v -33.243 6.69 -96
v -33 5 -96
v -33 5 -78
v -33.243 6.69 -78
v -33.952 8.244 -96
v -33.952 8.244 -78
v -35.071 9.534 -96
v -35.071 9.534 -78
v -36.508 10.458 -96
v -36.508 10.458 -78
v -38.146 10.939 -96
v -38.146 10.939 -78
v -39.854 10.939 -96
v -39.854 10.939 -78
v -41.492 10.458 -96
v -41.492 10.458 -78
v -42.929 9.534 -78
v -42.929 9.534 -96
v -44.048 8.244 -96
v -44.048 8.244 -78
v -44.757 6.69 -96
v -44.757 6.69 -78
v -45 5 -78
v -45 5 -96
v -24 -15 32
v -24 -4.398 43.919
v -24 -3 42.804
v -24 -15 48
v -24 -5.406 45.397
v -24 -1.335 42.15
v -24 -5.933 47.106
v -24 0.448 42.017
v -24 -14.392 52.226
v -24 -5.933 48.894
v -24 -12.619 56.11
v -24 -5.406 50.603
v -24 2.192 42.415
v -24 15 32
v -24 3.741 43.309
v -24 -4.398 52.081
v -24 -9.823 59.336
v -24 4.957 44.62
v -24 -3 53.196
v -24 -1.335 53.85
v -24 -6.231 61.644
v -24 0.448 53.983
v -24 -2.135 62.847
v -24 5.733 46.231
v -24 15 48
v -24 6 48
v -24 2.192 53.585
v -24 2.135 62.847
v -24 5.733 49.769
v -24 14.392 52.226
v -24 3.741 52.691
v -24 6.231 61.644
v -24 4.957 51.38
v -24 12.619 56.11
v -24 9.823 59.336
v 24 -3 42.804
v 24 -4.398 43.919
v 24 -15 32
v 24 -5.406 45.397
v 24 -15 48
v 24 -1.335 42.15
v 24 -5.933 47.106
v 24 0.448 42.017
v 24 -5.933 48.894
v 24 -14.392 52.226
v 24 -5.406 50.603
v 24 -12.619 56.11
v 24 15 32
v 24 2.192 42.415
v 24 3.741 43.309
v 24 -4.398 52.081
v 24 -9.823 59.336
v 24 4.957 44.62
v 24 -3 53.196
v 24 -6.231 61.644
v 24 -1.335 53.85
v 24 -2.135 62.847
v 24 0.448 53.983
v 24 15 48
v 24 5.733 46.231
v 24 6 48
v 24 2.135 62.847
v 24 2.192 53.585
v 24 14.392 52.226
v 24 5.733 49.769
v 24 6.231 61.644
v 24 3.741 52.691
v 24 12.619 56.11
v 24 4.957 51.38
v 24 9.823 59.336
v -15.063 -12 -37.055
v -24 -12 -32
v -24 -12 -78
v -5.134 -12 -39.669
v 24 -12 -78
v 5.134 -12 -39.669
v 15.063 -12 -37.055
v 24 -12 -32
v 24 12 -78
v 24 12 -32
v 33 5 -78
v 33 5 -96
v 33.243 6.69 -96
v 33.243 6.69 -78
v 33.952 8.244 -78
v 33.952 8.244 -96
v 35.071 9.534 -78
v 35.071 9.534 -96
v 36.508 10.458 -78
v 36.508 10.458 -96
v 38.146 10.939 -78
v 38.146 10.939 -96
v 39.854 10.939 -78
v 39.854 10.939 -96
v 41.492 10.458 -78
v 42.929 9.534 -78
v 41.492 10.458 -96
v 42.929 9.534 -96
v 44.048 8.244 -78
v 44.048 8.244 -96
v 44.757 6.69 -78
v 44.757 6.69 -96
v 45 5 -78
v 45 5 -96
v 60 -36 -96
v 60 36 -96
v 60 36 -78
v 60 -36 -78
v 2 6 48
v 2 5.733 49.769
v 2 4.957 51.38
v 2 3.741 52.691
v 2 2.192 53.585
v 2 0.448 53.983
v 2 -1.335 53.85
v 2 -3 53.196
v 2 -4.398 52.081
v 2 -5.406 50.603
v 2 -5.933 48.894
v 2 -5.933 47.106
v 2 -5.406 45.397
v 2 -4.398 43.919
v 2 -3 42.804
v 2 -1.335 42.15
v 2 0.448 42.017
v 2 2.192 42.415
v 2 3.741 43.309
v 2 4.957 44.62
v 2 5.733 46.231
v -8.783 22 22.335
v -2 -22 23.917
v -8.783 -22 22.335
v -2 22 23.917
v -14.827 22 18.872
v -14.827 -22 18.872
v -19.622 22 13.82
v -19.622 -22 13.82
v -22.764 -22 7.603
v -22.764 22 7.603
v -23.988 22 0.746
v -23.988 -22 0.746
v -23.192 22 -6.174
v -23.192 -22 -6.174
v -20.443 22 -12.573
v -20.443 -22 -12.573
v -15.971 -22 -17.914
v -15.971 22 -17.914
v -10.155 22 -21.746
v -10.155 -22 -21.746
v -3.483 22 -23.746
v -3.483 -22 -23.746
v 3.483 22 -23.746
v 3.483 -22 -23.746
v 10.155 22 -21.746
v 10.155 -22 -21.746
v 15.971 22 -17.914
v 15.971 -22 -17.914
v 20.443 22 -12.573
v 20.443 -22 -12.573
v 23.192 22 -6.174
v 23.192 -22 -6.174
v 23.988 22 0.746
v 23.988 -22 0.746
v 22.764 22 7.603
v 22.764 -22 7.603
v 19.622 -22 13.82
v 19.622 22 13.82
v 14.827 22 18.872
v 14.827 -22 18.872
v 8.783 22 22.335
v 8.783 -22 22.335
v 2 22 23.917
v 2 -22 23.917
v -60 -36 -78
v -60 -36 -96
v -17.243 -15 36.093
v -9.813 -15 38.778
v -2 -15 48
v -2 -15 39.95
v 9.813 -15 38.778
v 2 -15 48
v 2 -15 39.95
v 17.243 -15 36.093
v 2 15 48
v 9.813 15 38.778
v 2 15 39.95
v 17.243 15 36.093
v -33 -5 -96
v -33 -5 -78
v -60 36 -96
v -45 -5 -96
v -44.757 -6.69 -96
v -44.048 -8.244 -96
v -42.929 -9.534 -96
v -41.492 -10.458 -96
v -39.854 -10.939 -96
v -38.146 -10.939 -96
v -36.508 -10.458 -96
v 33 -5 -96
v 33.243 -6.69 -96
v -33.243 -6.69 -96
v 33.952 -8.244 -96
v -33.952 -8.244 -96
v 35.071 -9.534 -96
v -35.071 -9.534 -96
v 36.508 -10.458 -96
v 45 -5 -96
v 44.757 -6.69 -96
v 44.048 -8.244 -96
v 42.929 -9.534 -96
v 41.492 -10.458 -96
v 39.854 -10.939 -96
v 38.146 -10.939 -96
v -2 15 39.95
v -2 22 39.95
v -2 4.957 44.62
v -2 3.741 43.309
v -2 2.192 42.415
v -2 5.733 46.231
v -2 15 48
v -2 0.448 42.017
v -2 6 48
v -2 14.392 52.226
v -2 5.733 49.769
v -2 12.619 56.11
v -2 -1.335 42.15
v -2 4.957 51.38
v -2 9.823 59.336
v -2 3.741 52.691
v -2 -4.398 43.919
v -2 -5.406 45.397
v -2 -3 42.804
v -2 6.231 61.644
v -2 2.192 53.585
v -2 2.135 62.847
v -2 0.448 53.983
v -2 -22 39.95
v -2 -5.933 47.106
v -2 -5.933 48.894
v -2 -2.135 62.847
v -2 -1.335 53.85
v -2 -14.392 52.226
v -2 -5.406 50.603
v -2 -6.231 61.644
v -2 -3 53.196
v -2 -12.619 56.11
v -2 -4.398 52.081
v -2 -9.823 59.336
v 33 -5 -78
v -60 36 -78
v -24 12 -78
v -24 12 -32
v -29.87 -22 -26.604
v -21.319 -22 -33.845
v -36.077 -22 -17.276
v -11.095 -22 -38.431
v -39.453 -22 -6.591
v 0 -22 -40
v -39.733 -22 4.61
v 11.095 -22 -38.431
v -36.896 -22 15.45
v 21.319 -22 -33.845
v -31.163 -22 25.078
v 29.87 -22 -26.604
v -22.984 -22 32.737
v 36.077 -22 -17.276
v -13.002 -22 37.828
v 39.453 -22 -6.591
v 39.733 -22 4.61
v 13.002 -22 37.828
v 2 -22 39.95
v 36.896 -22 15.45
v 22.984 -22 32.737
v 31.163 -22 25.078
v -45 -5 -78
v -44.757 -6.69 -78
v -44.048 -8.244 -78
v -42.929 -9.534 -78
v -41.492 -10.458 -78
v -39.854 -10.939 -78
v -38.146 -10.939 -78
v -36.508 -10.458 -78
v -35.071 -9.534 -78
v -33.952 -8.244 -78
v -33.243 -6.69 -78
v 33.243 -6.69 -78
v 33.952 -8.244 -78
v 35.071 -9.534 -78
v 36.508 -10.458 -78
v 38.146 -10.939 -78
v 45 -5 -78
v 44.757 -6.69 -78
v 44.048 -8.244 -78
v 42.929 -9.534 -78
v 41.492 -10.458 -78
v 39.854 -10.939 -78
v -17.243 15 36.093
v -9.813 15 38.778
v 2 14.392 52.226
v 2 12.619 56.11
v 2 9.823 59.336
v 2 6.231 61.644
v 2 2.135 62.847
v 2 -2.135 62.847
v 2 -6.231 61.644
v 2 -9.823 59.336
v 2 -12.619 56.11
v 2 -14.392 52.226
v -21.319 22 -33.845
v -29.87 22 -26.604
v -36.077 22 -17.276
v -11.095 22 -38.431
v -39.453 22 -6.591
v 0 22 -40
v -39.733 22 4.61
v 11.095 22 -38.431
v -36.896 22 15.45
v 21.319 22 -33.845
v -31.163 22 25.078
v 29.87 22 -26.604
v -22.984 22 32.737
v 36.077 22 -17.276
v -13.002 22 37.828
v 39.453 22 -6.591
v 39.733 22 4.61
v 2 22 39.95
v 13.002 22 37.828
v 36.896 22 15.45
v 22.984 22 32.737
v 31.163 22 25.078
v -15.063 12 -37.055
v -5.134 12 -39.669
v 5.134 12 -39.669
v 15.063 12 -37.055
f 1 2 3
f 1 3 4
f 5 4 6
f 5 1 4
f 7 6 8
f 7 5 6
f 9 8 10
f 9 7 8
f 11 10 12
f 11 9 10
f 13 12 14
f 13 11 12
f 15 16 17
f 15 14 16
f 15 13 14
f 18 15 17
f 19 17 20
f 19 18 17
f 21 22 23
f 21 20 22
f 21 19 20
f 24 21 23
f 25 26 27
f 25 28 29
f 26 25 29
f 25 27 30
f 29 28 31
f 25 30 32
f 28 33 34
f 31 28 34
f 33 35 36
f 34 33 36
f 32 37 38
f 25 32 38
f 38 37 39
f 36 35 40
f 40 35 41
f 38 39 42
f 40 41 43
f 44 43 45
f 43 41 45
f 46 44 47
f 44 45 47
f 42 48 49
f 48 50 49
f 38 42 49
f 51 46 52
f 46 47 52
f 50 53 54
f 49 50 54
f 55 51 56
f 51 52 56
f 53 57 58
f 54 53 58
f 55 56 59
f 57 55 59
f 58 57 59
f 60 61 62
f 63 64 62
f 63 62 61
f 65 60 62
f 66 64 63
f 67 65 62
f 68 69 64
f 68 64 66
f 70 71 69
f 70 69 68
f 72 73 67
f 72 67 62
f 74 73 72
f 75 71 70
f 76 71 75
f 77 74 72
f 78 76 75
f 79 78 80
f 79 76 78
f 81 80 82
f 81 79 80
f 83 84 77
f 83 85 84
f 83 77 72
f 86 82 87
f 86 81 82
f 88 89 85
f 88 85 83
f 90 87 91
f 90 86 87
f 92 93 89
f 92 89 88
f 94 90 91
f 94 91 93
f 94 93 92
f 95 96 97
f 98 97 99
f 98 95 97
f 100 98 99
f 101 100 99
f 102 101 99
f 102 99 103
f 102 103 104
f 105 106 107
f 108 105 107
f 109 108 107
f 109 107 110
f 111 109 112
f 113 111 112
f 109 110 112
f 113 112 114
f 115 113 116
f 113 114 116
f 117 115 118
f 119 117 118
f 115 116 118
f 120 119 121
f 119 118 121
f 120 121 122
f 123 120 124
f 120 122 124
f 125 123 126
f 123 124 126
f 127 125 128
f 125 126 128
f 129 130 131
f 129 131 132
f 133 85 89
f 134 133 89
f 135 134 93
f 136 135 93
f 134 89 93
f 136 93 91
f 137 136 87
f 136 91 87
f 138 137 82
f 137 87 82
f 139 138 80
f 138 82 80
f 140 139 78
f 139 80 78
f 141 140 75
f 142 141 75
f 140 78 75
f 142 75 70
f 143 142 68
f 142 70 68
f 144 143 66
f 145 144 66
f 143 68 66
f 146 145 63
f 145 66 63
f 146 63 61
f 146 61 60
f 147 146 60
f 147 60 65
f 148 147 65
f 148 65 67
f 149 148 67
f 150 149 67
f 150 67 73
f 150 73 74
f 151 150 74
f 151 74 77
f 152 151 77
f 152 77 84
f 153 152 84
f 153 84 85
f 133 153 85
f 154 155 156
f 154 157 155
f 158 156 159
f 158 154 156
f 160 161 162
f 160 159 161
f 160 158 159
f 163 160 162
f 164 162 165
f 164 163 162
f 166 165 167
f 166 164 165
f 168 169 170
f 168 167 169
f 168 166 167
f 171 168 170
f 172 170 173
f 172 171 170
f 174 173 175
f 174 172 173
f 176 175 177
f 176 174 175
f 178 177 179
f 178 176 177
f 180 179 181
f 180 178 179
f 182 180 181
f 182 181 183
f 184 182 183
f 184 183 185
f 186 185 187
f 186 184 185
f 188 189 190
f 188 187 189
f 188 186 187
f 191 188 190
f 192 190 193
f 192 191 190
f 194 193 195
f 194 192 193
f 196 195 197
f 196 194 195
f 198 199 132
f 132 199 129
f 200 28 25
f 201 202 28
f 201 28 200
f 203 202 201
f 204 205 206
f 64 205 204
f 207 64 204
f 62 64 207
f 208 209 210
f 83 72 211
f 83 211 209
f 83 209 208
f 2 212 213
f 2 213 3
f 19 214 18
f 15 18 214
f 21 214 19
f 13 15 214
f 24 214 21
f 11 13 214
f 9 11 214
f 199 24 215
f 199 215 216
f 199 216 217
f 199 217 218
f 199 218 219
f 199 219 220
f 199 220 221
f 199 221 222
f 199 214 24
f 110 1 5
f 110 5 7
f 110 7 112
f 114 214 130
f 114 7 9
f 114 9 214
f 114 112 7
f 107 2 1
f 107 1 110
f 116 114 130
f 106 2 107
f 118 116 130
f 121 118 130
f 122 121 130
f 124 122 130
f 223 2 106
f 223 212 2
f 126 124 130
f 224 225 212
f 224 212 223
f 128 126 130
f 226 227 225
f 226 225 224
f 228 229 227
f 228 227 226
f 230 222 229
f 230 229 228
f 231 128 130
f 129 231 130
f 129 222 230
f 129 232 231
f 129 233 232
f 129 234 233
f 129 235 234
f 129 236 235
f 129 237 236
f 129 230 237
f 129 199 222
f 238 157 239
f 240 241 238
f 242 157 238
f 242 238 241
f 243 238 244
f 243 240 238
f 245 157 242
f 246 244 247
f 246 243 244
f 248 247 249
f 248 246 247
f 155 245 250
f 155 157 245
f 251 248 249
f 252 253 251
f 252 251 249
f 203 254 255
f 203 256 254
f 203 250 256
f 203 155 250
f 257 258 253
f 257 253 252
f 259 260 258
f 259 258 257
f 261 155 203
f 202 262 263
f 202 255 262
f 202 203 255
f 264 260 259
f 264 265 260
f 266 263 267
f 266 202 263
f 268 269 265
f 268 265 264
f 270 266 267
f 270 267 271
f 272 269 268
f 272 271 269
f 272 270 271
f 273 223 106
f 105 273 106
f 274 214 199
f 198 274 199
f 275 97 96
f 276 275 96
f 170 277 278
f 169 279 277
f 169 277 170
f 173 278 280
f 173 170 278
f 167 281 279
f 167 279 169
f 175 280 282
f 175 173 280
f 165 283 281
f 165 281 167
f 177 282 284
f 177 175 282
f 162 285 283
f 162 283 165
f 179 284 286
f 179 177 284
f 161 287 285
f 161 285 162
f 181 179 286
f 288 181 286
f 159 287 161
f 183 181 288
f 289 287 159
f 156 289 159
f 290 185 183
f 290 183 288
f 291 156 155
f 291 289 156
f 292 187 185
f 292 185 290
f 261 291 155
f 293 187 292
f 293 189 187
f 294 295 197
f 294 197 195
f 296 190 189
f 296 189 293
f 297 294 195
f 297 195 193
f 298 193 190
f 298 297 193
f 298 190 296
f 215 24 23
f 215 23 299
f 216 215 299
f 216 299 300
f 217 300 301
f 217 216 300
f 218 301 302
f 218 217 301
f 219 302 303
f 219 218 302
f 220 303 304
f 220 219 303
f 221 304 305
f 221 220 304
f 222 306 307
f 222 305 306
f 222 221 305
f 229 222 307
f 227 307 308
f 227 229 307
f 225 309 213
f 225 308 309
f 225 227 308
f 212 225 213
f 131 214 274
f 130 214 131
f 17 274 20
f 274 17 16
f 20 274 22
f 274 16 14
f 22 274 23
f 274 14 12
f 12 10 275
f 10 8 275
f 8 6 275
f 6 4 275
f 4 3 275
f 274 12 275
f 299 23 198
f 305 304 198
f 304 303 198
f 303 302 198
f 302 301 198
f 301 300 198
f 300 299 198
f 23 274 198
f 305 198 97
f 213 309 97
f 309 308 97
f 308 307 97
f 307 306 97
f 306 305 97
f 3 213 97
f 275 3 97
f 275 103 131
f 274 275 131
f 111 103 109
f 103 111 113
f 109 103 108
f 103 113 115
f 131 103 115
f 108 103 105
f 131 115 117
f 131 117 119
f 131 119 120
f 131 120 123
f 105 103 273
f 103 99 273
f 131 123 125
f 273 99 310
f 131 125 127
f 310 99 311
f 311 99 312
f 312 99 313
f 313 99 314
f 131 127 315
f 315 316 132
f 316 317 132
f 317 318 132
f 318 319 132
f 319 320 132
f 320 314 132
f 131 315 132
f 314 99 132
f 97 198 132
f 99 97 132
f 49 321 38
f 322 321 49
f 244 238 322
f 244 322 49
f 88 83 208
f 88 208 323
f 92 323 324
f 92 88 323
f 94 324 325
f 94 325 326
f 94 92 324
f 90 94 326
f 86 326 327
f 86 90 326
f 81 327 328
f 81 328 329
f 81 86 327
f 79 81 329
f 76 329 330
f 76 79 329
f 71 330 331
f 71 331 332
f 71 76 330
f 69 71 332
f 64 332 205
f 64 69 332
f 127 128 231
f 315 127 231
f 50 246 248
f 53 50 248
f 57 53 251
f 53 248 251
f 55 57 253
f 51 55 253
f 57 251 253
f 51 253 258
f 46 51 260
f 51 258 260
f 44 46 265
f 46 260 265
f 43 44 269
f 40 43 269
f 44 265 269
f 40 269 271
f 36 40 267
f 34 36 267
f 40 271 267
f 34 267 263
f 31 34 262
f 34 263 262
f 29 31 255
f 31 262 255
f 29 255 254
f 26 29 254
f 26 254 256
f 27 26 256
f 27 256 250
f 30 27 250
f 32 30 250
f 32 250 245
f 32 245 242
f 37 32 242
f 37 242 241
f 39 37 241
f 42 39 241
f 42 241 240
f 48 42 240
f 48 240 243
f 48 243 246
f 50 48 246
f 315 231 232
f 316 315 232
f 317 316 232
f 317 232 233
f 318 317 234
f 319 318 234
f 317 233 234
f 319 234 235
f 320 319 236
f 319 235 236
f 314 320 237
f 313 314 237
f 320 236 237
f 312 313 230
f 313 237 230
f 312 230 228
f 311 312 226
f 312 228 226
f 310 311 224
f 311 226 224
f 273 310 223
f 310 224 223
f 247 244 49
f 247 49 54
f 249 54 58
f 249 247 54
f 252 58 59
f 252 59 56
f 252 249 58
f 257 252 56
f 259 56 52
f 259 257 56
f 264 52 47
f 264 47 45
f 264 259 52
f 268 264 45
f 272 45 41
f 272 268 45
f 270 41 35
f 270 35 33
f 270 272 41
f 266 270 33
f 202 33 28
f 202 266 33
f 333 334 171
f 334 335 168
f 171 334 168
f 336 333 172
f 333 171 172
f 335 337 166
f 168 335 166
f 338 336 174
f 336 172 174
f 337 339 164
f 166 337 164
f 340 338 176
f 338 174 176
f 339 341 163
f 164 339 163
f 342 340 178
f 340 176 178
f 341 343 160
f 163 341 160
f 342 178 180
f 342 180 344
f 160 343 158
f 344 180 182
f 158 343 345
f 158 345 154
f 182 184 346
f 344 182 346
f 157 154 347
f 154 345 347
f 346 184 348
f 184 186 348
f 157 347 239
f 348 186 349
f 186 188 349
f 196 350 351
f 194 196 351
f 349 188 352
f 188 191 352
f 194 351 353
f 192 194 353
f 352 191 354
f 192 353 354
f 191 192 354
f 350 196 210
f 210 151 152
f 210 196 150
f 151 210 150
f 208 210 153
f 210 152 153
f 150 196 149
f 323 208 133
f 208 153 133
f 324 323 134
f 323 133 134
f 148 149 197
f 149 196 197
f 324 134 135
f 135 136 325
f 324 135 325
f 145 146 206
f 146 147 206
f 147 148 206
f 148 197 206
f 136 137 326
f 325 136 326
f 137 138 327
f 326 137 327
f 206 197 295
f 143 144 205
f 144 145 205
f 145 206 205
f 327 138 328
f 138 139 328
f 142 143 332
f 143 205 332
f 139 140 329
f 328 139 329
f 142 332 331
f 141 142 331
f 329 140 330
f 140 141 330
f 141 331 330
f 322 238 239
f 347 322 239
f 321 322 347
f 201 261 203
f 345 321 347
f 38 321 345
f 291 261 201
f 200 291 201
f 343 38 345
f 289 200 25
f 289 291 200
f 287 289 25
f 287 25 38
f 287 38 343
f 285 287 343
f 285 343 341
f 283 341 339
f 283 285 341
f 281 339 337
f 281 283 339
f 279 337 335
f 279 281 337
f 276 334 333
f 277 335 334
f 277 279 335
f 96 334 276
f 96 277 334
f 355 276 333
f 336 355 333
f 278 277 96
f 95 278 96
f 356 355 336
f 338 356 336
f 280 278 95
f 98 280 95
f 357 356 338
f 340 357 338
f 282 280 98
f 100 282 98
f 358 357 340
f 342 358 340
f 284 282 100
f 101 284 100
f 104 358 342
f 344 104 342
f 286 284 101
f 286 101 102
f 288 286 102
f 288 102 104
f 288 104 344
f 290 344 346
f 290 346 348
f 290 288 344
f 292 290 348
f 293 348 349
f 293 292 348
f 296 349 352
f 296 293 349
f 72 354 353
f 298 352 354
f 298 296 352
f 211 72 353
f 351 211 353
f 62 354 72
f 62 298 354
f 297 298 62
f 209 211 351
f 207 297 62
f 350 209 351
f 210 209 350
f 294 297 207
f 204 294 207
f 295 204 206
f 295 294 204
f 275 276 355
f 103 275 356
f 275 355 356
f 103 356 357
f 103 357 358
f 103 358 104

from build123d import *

# Parameters (mm, degrees)
F0_R      = 40
F0_R_2    = 24
F1_DEPTH  = 22
F2_W      = 48
F2_H      = 64
F3_DEPTH  = 12
F4_W      = 120
F4_H      = 72
F5_DEPTH  = 18
F7_DEPTH  = 24
F8_R      = 6
F9_DEPTH  = 84.001
F11_DEPTH = 25
F12_W     = 4
F12_H     = 50
F13_DEPTH = 25


# Not quite as in the source:
# - a pattern or mirror of a feature is missing from the dataset's text; its kind, count and spacing are read off the source's solid


with BuildPart() as f1:
    # F0 (on Front) → F1 (new body, symmetric)
    with BuildSketch(Plane.XZ):
        Circle(F0_R)
        Circle(F0_R_2, mode=Mode.SUBTRACT)
    extrude(amount=F1_DEPTH, both=True)

    # F2 (on Front) → F3 (join, symmetric)
    with BuildSketch(Plane.XZ):
        with Locations((0, -64)):
            Rectangle(F2_W, F2_H)
    extrude(amount=F3_DEPTH, both=True)

    # F4 (on face) → F5 (join)
    with BuildSketch(Plane(origin=(0, 0, -96), x_dir=(1, 0, 0), z_dir=(0, 0, -1))):
        Rectangle(F4_W, F4_H)
    extrude(amount=-F5_DEPTH)

    # F6 (on Right) → F7 (join, symmetric)
    with BuildSketch(Plane.YZ):
        with BuildLine():
            Line((-15, 25), (15, 25))
            Line((15, 25), (15, 48))
            ThreePointArc((15, 48), (0, 63), (-15, 48))
            Line((-15, 48), (-15, 25))
        make_face()
    extrude(amount=F7_DEPTH, both=True)

    # F8 (on face) → F9 (cut, through all)
    with BuildSketch(Plane.YZ.offset(24)):
        with Locations((0, 48)):
            Circle(F8_R)
    extrude(amount=-F9_DEPTH, mode=Mode.SUBTRACT)

    # F10 (on face) → F11 (cut)
    with BuildSketch(Plane(origin=(0, 0, -96), x_dir=(1, 0, 0), z_dir=(0, 0, -1))):
        with BuildLine():
            Line((45, -5), (45, 5))
            ThreePointArc((45, 5), (39, 11), (33, 5))
            Line((33, 5), (33, -5))
            ThreePointArc((33, -5), (39, -11), (45, -5))
        make_face()
    f11 = extrude(amount=-F11_DEPTH, mode=Mode.SUBTRACT)

    # F11_copies: F11 across plane
    add(f11.mirror(Plane(origin=(0, 0, 0), x_dir=(0, 0, -1), z_dir=(-1, 0, 0))), mode=Mode.SUBTRACT)

    # F12 (on Front) → F13 (cut, symmetric)
    with BuildSketch(Plane.XZ):
        with Locations((0, 45)):
            Rectangle(F12_W, F12_H)
    extrude(amount=F13_DEPTH, both=True, mode=Mode.SUBTRACT)


solid = f1.part
